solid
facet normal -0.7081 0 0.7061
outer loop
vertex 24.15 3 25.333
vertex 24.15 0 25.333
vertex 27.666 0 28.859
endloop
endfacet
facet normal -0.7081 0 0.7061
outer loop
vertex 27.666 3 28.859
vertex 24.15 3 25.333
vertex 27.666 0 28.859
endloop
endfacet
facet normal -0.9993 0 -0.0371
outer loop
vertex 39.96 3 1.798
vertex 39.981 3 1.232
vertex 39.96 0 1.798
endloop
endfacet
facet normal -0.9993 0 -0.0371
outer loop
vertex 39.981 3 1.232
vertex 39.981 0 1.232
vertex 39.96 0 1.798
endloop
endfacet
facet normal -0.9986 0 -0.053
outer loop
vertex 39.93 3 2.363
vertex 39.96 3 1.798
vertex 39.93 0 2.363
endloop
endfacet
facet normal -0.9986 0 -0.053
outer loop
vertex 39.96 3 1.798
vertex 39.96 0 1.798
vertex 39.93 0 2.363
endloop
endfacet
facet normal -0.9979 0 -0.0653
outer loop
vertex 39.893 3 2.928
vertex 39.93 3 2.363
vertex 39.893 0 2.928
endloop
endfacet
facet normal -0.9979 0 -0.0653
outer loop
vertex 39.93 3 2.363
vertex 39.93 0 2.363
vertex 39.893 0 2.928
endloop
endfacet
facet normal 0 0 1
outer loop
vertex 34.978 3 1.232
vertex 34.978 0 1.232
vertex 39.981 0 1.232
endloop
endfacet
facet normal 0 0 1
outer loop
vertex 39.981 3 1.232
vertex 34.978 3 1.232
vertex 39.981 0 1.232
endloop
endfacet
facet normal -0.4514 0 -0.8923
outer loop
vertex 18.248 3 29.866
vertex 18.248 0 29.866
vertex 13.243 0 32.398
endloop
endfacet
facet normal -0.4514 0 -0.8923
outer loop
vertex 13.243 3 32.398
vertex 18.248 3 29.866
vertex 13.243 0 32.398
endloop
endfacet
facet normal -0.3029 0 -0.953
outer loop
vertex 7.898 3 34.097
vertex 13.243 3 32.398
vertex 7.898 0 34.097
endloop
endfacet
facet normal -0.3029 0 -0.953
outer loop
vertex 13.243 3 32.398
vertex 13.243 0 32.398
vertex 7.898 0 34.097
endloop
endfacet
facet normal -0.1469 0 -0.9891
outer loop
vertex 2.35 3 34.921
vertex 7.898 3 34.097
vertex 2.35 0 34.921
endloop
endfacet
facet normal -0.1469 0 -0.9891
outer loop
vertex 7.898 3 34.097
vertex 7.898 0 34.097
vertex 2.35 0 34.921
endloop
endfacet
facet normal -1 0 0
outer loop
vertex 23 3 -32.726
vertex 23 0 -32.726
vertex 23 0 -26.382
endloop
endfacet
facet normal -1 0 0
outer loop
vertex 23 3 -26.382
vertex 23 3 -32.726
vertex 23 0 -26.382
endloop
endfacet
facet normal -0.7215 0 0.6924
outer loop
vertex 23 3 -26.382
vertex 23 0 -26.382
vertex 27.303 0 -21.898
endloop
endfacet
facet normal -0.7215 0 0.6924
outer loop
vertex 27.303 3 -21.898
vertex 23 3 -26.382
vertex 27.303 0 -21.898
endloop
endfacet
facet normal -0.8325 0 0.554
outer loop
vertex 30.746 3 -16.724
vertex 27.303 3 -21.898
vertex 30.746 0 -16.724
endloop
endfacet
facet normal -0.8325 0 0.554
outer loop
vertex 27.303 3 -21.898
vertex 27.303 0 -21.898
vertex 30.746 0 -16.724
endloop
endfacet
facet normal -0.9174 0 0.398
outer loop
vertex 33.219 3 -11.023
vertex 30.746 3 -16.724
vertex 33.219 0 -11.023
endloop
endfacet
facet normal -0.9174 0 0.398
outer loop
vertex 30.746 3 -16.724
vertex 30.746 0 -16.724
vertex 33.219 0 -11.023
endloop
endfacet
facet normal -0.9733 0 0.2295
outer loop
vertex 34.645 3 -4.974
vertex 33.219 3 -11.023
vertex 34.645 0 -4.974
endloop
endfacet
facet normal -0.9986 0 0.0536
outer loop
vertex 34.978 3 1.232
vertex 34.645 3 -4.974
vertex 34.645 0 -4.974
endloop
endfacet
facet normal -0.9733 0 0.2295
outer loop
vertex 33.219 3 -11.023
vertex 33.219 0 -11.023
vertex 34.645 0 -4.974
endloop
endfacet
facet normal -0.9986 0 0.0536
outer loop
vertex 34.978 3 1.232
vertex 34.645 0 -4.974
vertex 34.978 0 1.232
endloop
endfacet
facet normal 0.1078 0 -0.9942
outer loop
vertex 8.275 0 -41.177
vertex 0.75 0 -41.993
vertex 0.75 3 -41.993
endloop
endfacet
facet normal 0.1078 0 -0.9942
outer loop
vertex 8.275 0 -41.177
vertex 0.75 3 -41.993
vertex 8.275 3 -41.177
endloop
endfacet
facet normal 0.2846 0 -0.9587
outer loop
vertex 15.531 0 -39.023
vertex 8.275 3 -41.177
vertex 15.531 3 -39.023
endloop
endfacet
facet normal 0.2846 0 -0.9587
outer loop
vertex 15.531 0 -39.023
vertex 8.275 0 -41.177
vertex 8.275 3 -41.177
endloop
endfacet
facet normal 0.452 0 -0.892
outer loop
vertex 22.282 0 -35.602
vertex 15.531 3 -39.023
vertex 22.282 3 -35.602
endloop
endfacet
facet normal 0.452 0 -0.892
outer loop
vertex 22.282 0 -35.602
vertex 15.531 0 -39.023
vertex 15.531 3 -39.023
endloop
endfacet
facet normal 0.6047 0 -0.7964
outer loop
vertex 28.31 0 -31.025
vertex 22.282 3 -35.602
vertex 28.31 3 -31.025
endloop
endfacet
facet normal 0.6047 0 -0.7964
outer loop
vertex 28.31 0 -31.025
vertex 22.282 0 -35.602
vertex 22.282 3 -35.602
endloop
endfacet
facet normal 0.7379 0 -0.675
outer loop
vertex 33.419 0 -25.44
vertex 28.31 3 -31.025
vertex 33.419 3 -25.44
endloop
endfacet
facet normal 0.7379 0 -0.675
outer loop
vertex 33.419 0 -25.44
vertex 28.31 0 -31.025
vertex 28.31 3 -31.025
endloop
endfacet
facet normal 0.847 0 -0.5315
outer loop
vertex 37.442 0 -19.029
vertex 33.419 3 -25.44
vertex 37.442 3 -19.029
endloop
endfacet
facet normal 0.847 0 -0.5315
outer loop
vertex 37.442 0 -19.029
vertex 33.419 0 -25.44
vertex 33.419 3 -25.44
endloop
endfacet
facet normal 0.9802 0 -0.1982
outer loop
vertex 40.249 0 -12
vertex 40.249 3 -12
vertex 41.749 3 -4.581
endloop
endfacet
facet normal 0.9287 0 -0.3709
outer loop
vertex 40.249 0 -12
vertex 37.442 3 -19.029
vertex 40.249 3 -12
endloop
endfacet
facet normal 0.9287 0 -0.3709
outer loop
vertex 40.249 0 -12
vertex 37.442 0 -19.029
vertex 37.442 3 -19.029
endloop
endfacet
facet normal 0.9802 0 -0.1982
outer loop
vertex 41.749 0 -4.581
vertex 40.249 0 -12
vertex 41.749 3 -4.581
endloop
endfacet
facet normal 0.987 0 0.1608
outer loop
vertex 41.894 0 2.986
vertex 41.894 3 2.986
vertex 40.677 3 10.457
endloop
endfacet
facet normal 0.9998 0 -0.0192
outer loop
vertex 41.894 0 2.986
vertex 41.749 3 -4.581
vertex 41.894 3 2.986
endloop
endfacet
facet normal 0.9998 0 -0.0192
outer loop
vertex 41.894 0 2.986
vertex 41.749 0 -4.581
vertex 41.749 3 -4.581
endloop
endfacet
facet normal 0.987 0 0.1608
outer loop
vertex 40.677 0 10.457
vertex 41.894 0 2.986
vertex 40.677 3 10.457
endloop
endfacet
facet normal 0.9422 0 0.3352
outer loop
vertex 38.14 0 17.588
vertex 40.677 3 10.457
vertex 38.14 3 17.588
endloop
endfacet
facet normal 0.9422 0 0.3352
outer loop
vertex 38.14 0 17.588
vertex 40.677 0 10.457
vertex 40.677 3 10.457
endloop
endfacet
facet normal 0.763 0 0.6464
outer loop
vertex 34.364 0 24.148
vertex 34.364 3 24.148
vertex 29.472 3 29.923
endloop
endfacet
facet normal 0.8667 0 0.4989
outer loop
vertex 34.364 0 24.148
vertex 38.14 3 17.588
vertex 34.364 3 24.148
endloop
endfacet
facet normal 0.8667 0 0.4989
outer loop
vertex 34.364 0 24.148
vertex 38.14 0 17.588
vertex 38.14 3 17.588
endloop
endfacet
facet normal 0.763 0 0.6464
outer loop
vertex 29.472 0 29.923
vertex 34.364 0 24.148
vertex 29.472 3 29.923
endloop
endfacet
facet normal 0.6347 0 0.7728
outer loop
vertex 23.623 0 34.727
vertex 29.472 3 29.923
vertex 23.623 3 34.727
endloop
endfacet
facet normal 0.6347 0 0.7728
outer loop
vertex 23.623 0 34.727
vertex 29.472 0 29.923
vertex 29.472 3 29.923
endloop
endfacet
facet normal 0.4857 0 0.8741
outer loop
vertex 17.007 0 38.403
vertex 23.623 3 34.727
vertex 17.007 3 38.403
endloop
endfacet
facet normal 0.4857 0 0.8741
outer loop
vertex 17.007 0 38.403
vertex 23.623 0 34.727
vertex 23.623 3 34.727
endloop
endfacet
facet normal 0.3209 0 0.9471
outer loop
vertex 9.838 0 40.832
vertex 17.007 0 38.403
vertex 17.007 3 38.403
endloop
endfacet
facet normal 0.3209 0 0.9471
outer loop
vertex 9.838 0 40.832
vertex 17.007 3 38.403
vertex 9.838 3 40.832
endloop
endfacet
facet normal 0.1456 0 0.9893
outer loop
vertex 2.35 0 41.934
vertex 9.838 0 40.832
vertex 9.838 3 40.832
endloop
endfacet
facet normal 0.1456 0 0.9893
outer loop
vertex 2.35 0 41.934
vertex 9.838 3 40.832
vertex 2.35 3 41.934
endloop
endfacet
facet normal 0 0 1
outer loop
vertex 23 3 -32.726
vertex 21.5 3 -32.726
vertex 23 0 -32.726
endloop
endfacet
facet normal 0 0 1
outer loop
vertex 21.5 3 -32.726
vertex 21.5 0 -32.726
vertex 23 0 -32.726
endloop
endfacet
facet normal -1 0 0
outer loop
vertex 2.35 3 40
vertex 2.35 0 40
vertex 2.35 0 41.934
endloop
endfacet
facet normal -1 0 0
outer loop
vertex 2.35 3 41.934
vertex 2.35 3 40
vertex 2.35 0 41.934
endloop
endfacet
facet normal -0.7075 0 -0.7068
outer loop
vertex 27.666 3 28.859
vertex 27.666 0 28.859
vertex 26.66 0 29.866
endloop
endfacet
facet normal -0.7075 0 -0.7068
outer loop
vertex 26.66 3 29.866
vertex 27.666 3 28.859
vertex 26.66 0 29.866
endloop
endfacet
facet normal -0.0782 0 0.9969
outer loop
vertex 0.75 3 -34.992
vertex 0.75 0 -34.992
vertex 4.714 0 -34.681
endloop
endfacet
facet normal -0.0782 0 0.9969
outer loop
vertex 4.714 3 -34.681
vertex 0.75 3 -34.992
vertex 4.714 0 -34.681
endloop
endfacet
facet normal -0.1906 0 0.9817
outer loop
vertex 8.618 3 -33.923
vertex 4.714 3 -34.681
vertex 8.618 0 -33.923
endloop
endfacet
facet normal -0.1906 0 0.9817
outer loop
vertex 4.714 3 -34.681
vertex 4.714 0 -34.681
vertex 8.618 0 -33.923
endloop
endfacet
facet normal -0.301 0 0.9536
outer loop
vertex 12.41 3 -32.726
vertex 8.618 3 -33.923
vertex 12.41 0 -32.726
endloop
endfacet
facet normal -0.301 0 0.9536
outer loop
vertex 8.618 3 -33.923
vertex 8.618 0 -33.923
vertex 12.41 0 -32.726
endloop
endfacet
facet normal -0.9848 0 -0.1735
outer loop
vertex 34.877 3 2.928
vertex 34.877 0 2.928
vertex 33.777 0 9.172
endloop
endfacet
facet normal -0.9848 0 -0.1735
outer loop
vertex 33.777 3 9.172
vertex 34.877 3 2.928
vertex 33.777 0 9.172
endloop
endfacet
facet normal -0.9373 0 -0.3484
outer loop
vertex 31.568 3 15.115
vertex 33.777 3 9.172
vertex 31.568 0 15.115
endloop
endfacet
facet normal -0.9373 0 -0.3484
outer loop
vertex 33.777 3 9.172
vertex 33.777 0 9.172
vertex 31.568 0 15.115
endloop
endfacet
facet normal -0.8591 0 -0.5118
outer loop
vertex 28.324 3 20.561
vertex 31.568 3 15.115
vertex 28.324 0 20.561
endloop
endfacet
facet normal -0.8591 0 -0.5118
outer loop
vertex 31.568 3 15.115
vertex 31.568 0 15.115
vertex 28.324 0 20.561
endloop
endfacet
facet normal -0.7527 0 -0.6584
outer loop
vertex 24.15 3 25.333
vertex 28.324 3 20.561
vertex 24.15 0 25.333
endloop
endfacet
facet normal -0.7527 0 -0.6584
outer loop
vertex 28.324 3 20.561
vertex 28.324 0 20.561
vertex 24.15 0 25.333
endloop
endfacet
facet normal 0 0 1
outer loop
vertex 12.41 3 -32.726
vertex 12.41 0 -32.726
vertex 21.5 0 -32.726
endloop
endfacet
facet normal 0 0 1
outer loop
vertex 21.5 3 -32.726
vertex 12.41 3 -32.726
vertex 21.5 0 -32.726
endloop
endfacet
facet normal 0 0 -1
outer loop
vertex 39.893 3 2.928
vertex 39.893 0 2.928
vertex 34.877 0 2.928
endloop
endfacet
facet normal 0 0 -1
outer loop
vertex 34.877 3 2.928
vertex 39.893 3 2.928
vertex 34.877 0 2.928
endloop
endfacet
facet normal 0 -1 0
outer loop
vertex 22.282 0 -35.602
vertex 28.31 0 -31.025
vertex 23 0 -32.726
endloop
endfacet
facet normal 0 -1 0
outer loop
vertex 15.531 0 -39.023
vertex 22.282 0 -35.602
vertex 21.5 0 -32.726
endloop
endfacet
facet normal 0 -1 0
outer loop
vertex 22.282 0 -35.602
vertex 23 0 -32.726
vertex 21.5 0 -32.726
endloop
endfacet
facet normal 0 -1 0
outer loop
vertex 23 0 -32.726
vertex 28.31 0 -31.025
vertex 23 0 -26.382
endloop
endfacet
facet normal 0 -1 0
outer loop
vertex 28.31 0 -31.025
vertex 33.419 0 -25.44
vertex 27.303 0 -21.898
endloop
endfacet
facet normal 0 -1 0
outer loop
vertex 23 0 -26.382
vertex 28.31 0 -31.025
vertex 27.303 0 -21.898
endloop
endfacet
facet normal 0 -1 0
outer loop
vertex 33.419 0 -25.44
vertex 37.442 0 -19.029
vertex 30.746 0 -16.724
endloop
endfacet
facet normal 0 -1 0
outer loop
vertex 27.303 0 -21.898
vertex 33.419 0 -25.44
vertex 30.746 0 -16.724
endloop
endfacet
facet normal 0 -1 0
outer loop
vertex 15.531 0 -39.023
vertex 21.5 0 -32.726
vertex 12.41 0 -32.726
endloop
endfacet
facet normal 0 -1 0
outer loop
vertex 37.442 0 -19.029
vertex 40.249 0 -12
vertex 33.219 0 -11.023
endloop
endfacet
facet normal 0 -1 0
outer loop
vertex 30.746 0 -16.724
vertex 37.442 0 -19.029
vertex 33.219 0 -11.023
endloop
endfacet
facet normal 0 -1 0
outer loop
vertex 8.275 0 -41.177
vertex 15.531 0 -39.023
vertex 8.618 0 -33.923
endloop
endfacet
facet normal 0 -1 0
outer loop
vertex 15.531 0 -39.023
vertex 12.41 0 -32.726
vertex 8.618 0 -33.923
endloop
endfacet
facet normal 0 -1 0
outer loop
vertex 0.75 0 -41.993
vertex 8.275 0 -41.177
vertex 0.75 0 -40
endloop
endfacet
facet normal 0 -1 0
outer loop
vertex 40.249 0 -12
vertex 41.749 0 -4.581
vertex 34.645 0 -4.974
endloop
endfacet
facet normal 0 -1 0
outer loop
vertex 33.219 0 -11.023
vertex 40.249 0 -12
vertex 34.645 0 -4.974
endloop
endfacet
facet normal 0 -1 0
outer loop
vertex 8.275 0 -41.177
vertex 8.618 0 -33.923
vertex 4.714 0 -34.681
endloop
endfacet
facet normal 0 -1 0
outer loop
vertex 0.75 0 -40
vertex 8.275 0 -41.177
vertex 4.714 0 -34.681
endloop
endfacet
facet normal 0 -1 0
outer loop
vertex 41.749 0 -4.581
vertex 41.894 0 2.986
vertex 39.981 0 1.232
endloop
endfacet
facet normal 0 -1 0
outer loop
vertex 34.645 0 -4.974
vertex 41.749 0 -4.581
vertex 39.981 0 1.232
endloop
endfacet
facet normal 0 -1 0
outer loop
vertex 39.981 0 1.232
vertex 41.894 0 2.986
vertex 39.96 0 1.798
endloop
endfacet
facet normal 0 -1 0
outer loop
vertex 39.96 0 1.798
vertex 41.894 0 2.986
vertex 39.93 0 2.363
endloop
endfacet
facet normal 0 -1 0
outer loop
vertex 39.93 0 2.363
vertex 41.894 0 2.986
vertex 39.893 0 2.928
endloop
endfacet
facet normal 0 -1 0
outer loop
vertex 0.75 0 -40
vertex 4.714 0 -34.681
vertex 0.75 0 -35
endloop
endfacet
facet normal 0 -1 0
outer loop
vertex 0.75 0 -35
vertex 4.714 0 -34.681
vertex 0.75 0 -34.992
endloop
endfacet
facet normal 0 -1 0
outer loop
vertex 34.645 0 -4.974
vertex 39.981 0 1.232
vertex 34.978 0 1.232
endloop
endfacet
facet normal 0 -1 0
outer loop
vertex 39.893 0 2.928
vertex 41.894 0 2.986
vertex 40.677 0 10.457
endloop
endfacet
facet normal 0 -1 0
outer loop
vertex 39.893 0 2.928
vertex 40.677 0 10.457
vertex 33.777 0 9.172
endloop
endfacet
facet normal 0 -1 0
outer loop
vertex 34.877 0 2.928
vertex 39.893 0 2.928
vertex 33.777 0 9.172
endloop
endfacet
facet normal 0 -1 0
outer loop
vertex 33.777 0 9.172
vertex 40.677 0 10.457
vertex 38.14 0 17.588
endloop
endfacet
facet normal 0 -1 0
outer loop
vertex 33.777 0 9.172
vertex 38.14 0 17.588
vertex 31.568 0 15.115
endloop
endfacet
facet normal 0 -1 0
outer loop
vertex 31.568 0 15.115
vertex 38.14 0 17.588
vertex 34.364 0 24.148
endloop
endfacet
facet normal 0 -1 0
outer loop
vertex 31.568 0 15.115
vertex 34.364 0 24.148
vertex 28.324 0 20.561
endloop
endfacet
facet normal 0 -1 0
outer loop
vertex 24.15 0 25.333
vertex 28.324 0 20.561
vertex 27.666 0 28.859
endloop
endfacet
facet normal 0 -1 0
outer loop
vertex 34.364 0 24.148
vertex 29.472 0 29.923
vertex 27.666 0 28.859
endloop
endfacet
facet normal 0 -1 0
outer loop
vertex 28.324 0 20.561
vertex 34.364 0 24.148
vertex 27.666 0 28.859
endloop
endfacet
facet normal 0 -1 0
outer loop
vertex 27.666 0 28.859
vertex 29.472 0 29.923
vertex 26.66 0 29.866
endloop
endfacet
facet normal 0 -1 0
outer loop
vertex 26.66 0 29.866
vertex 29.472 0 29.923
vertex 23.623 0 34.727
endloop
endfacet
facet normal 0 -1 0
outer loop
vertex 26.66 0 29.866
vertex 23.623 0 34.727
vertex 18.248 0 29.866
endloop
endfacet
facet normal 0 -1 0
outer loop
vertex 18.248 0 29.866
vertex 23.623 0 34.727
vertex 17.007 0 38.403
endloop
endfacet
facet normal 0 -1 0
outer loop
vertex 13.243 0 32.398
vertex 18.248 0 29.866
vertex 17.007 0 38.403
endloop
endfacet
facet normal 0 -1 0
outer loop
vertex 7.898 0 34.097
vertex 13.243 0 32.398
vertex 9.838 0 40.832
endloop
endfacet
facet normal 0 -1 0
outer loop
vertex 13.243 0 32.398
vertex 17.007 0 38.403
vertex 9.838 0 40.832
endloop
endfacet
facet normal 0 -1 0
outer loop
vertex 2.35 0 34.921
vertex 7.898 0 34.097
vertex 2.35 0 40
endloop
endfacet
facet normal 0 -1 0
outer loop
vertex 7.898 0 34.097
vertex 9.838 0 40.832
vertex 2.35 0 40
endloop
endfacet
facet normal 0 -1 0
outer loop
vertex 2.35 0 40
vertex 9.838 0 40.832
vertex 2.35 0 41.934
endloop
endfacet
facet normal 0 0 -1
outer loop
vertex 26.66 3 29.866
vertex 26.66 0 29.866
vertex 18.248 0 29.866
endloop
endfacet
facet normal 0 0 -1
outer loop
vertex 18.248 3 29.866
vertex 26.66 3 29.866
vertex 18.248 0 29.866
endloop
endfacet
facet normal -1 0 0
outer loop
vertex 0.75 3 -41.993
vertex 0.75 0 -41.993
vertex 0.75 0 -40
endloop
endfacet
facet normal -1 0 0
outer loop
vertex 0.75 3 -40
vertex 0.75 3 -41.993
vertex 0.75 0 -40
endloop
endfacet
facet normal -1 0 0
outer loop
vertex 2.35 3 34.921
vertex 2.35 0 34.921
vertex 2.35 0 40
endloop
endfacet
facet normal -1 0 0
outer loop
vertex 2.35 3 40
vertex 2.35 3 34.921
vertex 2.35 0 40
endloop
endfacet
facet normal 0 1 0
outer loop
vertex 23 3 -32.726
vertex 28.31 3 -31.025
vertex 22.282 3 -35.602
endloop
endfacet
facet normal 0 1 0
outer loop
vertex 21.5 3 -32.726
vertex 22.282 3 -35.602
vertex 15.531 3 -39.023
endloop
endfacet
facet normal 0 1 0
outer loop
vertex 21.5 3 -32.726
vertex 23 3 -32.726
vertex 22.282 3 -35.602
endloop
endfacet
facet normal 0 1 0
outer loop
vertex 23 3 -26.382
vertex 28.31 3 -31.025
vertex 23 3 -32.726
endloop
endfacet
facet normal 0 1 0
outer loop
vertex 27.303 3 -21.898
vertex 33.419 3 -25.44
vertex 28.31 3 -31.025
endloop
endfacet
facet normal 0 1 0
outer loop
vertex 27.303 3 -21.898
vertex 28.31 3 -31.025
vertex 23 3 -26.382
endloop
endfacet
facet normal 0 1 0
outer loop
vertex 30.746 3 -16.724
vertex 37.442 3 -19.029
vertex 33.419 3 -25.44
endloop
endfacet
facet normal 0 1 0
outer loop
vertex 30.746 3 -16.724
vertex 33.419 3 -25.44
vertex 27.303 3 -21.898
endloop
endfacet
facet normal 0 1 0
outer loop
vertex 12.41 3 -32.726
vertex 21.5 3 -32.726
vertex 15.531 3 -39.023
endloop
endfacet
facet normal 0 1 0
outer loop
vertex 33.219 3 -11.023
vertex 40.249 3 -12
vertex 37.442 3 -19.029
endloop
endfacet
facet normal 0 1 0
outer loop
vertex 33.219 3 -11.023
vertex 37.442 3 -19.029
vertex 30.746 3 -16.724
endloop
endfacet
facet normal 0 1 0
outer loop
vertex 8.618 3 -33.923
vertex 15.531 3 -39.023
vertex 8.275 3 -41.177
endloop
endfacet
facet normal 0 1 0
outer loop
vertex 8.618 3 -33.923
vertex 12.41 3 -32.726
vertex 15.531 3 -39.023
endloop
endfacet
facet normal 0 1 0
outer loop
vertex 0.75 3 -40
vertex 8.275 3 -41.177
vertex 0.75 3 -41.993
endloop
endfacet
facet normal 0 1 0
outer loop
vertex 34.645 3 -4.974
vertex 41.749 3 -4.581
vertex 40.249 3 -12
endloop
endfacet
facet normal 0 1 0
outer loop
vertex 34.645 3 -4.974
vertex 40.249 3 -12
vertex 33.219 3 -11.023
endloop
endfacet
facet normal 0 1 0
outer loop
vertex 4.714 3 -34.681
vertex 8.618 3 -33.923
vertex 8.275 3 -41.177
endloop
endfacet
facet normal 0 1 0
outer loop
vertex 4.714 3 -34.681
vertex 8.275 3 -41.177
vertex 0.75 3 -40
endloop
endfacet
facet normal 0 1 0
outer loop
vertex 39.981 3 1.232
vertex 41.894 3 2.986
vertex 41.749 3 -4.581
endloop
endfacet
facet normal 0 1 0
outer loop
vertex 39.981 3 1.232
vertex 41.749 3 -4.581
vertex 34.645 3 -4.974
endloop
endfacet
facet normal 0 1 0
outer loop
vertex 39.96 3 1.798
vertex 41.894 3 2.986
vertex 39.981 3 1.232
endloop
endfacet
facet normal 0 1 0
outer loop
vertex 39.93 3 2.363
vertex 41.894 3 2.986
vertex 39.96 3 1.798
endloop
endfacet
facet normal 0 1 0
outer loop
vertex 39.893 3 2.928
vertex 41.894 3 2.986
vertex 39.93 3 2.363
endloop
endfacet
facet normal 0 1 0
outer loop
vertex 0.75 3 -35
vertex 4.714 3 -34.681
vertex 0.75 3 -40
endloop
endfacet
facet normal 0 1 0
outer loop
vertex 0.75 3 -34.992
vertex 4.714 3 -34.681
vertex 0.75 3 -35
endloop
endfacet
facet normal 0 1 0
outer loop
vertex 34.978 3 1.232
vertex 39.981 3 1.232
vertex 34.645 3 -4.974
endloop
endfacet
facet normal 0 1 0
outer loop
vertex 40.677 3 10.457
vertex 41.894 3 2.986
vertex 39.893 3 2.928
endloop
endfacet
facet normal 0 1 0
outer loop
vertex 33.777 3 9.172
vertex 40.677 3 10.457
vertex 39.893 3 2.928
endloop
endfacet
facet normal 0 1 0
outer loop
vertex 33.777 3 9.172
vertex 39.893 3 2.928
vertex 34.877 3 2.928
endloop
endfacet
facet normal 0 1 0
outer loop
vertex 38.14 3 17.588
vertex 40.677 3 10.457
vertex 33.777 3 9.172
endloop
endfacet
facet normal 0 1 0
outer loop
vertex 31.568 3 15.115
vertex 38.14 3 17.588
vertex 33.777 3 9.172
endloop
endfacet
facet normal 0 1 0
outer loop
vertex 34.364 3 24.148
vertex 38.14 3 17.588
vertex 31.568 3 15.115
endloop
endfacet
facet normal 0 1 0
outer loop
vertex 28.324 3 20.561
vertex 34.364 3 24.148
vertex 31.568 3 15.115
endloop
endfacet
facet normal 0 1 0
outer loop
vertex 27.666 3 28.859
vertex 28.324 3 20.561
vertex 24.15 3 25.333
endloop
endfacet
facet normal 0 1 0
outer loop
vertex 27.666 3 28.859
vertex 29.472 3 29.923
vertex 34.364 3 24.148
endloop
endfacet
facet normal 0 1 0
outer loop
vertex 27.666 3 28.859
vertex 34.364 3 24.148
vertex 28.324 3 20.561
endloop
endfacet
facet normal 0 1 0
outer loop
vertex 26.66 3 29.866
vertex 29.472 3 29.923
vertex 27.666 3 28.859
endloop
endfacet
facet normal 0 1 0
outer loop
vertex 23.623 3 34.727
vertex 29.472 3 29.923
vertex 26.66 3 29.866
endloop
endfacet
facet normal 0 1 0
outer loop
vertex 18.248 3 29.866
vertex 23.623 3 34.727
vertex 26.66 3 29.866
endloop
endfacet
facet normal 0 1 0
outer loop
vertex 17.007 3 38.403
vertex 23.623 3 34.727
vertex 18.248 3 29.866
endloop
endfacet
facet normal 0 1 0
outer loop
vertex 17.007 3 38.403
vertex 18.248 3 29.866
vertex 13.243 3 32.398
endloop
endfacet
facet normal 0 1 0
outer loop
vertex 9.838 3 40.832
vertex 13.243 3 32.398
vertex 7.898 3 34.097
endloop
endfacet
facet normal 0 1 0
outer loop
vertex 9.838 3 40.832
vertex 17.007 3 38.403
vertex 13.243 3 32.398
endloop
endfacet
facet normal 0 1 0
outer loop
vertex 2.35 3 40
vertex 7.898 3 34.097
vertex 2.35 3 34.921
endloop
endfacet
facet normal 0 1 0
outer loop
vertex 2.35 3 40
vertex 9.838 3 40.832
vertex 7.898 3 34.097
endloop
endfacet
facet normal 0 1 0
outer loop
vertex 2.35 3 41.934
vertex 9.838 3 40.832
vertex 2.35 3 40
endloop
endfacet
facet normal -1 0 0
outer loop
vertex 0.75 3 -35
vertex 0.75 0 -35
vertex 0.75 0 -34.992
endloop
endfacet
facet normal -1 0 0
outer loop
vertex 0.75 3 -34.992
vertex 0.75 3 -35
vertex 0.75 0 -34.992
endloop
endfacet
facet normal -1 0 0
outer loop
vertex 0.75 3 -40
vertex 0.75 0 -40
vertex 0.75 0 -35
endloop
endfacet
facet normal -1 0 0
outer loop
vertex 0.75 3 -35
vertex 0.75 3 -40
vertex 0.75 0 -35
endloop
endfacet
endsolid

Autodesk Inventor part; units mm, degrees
ref_plane "YZ Plane" through (0, 0, 0) normal (1, 0, 0) x (0, 1, 0)
ref_plane "XZ Plane" through (0, 0, 0) normal (0, 1, 0) x (-1, 0, 0)
ref_plane "XY Plane" through (0, 0, 0) normal (0, 0, 1) x (1, 0, 0)
sketch "Sketch1" plane through (0, 0, 0) normal (0, 1, 0) x (-1, 0, 0)
  circle A0 centre (0, 0) radius 40
  circle A1 centre (0, 0) radius 35
  line L0 (-0.75, -40) -> (-0.75, -35)
  line L1 (-23, -26.381812) -> (-23, -32.726136)
  line L2 (-34.93812, 2.828496) -> (-39.945867, 2.828496)
  line L3 (-39.945867, 1.33215) -> (-34.93812, 1.33215)
  line L4 (-24.132224, 25.315702) -> (-27.666452, 28.85856)
  line L5 (-26.660208, 29.866295) -> (-27.720868, 28.808219)
  line L6 (-39.940266, 2.933386) -> (-39.940266, 1.43704)
  line L7 (-23, -32.726136) -> (-21.5, -32.726136)
  circle A2 centre (0, 0) radius 42
  line L8 (-2.35, 40) -> (-2.35, 32.985933)
  line L9 (-27.666452, 28.85856) -> (-27.668423, 28.860536)
  line L10 (-26.660208, 29.866295) -> (-18.248408, 29.866295)
  line L11 (-21.5, -32.726136) -> (-12.409674, -32.726136)
  line L12 (-0.75, -35) -> (-0.75, -34.991963)
  line L13 (-34.93812, 2.828496) -> (-34.885522, 2.828496)
  line L14 (-39.945867, 1.33215) -> (-39.977811, 1.33215)
  line L15 (-39.940266, 1.43704) -> (-39.940266, 1.33215)
  line L16 (-0.75, -40) -> (-0.75, -41.993303)
  line L17 (-2.35, 40) -> (-2.35, 41.934204)
  line L18 (-39.892655, 2.928496) -> (-34.877269, 2.928496)
  line L19 (-34.978305, 1.23215) -> (-39.981018, 1.23215)
  line L20 (-39.892655, 2.928496) -> (-39.940266, 2.933386)
  point P0 (-24.149901, 25.333422)
  point P1 (-2.35, 34.921018)
  point P2 (-2.35, 39.930909)
  point P3 (-0.75, -39.992968)
  point P4 (-34.974639, 1.33215)
  point P5 (-39.89987, 2.828496)
  dimension "d0" = 2
  dimension "d3" = 0.1
  dimension "d4" = 0.1
sketch "Sketch1 outline for Extrusion1" plane through (0, 0, 0) normal (0, 1, 0) x (-1, 0, 0)
  line L0 (-27.666452, 28.85856) -> (-26.660208, 29.866295)
  line L1 (-24.149901, 25.333422) -> (-27.666452, 28.85856)
  arc A0 (-34.877269, 2.928496) -> (-24.149901, 25.333422) centre (0, 0) cw
  line L2 (-39.892655, 2.928496) -> (-34.877269, 2.928496)
  arc A1 (-39.981018, 1.23215) -> (-39.892655, 2.928496) centre (0, 0) cw
  line L3 (-34.978305, 1.23215) -> (-39.981018, 1.23215)
  arc A2 (-23, -26.381812) -> (-34.978305, 1.23215) centre (0, 0) cw
  line L4 (-23, -32.726136) -> (-23, -26.381812)
  line L5 (-21.5, -32.726136) -> (-23, -32.726136)
  line L6 (-12.409674, -32.726136) -> (-21.5, -32.726136)
  arc A3 (-0.75, -34.991963) -> (-12.409674, -32.726136) centre (0, 0) cw
  line L7 (-0.75, -35) -> (-0.75, -34.991963)
  line L8 (-0.75, -40) -> (-0.75, -35)
  line L9 (-0.75, -41.993303) -> (-0.75, -40)
  arc A4 (-2.35, 41.934204) -> (-0.75, -41.993303) centre (0, 0) ccw
  line L10 (-2.35, 40) -> (-2.35, 41.934204)
  line L11 (-2.35, 34.921018) -> (-2.35, 40)
  arc A5 (-18.248408, 29.866295) -> (-2.35, 34.921018) centre (0, 0) cw
  line L12 (-26.660208, 29.866295) -> (-18.248408, 29.866295)
extrude "Extrusion1" add sketch "Sketch1 outline for Extrusion1" along normal blind 3
equation "\"d4\" = slack"
equation "\"slack\" = 0.1"
properties part number "Back_front_aligner"
